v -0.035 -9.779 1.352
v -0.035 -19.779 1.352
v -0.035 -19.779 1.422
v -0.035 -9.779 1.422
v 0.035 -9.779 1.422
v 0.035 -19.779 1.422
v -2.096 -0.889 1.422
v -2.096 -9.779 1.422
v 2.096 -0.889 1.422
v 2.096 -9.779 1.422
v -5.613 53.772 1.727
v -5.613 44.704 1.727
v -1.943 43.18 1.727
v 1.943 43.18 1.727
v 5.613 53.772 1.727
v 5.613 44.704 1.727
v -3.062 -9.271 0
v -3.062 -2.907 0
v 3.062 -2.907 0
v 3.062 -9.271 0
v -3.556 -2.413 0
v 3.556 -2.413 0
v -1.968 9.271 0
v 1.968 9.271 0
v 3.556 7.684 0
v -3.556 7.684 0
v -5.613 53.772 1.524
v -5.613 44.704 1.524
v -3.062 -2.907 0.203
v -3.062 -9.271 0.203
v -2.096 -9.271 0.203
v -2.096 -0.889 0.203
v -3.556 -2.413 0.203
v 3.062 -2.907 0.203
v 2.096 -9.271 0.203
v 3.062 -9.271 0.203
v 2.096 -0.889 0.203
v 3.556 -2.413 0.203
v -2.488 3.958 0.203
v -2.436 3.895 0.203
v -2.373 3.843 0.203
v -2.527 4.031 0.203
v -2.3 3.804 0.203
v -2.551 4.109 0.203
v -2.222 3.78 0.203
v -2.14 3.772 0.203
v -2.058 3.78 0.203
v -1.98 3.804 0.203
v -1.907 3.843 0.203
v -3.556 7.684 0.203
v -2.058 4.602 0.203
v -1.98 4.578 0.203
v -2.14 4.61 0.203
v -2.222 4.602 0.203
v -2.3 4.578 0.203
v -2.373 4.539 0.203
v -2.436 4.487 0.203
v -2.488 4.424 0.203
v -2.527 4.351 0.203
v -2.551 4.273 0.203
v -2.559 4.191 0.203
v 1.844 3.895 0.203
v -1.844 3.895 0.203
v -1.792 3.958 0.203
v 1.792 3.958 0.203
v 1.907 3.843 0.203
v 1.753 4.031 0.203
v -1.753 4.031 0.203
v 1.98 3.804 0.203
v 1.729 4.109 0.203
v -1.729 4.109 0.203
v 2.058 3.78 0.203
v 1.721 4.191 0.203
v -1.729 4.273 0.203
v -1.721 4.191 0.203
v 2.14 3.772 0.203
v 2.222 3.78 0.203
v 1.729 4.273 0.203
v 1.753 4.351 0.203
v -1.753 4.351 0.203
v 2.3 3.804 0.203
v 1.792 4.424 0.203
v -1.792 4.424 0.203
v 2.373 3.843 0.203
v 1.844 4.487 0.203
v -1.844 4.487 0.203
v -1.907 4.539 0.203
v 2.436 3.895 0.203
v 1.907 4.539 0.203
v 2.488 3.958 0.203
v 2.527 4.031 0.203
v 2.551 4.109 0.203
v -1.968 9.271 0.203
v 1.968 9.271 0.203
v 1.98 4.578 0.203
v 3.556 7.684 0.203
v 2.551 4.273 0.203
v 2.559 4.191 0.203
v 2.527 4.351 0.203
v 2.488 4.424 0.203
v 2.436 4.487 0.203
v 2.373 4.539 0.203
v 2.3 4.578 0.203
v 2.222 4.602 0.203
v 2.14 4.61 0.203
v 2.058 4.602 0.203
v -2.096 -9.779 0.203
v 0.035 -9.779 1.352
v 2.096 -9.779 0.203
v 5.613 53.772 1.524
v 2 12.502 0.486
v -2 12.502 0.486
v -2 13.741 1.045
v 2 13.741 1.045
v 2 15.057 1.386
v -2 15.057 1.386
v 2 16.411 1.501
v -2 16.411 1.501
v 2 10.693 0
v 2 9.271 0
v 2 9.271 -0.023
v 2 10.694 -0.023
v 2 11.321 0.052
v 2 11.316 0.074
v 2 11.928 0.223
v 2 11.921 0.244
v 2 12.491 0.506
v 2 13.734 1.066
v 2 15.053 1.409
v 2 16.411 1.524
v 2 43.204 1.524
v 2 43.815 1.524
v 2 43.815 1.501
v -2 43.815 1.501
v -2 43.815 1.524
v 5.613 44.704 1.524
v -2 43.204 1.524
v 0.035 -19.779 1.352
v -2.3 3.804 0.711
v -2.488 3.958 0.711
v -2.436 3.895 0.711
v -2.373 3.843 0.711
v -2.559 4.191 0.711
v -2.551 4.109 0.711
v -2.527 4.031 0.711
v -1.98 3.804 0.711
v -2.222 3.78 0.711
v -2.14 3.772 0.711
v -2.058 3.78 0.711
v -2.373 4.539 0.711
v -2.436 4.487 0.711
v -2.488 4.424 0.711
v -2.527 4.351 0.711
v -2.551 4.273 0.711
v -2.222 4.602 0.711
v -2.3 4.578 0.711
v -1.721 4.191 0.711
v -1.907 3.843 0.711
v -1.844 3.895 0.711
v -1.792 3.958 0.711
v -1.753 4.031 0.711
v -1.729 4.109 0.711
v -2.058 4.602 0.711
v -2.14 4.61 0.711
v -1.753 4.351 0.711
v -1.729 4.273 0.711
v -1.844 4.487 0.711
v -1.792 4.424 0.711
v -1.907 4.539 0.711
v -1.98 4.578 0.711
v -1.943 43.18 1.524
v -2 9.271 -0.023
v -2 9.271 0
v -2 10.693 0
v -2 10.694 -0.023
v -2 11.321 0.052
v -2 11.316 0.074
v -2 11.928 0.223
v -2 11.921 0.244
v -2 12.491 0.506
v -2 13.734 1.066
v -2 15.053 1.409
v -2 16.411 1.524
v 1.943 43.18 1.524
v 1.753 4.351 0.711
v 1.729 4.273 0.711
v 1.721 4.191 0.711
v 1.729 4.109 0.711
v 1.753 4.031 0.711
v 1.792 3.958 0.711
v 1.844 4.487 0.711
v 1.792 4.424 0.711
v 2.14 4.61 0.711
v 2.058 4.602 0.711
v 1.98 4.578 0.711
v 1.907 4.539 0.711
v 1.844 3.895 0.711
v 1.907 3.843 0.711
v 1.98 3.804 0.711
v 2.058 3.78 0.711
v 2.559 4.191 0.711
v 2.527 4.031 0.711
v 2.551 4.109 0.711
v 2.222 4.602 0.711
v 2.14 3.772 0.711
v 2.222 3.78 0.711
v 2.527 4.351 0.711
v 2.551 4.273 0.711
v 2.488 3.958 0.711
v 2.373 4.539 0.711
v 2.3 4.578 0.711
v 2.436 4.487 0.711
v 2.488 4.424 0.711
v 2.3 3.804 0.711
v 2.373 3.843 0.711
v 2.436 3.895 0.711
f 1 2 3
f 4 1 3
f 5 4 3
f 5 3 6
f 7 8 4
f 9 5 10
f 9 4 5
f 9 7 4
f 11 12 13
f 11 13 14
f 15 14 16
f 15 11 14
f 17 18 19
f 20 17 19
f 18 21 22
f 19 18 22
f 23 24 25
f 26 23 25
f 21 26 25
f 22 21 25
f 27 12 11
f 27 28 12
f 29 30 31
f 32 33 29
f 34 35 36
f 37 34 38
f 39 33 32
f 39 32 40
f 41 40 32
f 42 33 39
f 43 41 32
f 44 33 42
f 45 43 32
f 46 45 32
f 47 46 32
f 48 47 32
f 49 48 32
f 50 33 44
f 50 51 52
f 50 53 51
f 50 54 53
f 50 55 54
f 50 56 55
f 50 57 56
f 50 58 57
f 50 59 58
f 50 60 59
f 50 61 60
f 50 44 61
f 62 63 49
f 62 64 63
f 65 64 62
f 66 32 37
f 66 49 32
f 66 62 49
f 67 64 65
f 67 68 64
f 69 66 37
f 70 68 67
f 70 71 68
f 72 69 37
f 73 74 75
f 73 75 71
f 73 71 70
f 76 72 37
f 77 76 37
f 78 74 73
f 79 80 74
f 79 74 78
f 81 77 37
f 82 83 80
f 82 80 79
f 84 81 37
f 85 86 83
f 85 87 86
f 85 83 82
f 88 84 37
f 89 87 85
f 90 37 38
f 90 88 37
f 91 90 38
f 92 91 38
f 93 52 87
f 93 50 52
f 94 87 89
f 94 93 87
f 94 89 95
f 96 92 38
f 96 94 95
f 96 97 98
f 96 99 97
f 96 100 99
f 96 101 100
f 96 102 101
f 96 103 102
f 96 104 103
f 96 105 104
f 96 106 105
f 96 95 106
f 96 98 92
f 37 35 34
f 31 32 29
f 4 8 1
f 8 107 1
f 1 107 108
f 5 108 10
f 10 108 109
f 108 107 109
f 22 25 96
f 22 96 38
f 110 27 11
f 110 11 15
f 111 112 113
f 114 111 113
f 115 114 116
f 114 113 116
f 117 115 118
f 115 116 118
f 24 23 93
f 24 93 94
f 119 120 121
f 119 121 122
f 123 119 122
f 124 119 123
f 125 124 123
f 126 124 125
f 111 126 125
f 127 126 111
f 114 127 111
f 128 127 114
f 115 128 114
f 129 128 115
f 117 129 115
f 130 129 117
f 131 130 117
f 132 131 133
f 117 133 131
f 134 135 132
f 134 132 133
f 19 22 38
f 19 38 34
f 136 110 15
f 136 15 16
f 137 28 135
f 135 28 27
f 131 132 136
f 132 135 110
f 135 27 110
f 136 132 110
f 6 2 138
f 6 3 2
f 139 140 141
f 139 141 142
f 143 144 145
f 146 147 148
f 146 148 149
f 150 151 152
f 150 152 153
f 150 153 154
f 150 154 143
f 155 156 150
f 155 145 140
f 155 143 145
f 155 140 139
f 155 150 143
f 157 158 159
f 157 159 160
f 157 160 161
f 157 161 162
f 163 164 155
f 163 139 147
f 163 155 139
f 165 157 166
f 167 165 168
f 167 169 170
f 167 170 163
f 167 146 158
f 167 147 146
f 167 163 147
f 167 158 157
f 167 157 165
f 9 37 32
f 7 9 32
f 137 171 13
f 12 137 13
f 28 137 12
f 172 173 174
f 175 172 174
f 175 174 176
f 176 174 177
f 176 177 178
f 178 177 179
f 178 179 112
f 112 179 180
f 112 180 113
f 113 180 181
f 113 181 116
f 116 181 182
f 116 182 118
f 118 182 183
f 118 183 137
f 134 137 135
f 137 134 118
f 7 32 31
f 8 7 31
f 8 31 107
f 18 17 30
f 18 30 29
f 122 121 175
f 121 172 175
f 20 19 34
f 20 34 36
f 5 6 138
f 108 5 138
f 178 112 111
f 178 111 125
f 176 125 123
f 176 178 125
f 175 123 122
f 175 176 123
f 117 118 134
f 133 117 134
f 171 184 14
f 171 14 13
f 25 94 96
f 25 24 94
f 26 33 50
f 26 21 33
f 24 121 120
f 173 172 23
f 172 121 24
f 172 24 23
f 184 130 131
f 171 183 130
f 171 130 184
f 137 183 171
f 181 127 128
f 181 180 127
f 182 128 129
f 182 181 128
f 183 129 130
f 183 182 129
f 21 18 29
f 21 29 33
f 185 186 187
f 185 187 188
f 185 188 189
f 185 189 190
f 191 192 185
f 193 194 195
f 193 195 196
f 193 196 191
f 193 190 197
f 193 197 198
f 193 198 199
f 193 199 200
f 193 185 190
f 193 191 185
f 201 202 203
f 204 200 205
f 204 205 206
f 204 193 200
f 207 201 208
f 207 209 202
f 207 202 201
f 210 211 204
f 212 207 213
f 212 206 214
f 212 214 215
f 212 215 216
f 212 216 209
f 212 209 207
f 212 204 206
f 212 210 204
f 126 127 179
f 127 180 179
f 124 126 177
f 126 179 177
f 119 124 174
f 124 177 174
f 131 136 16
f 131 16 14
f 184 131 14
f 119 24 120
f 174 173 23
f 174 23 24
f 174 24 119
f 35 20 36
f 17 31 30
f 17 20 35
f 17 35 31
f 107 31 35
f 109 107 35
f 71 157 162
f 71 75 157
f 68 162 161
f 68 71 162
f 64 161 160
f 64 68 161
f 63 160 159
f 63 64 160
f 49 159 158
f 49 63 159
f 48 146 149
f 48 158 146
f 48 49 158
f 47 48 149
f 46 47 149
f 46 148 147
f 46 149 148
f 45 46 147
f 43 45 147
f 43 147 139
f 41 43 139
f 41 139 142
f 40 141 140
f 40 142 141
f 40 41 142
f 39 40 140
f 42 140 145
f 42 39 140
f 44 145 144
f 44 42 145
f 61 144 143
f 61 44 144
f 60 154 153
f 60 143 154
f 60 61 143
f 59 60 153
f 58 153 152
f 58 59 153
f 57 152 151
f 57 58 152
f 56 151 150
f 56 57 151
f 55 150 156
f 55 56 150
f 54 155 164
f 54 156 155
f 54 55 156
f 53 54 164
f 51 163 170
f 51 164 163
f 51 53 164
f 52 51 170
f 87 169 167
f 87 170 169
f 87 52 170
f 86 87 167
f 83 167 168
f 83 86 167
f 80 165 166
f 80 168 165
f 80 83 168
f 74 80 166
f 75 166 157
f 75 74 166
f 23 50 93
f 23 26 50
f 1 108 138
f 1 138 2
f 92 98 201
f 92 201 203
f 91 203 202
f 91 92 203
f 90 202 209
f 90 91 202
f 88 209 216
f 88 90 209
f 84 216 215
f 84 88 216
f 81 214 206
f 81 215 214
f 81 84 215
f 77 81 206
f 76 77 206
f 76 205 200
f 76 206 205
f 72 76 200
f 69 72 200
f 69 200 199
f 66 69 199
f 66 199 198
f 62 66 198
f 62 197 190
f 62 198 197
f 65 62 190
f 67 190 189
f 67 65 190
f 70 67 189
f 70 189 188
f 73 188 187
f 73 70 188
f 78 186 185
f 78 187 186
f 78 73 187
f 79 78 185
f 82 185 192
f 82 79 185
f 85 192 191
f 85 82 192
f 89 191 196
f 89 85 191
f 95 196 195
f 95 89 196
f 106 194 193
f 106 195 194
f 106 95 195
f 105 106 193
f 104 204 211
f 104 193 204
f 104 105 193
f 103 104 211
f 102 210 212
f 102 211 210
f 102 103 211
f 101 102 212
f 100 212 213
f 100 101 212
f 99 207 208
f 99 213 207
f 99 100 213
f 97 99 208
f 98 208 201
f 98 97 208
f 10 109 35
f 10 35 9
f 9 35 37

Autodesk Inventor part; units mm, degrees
sketch "Sketch1" plane through (0, 0, 0) normal (0, 0, 1) x (1, 0, 0)
  line L0 (0, 133.1936) -> (0, -174.4071) projected
  line L1 (-82.221, 0) -> (96.7133, 0) projected
  line L2 (-11.8429, 78.7589) -> (29.9826, 78.7589) construction
  line L3 (29.9826, 78.7589) -> (29.9826, -20.6399) construction
  line L4 (29.9826, -20.6399) -> (-11.8429, -20.6399) construction
  line L5 (-11.8429, -20.6399) -> (-11.8429, 78.7589) construction
  line L6 (-7.642, -75.3683) -> (-7.642, -85.3683)
  line L7 (71.1512, 85.7776) -> (64.977, -130.4641) construction
  line L8 (64.977, -130.4641) -> (-56.659, -126.9911) construction
  line L9 (-56.659, -126.9911) -> (-50.4848, 89.2506) construction
  line L10 (-50.4848, 89.2506) -> (71.1512, 85.7776) construction
  line L11 (-1.9685, 9.271) -> (1.9685, 9.271)
  line L12 (1.9685, 9.271) -> (3.556, 7.6835)
  line L13 (3.556, 7.6835) -> (3.556, -2.413)
  line L14 (3.556, -2.413) -> (3.0619, -2.9071)
  line L15 (3.0619, -2.9071) -> (3.0619, -9.271)
  line L16 (3.0619, -9.271) -> (-3.0619, -9.271)
  line L17 (-3.0619, -9.271) -> (-3.0619, -2.9071)
  line L18 (-3.0619, -2.9071) -> (-3.556, -2.413)
  line L19 (-3.556, -2.413) -> (-3.556, 7.6835)
  line L20 (-3.556, 7.6835) -> (-1.9685, 9.271)
  line L21 (0, 0) -> (0, 10.9448)
  line L22 (1.9431, 43.18) -> (-1.9431, 43.18)
  line L23 (-1.9431, 43.18) -> (-1.9431, 9.271)
  line L24 (-1.9431, 9.271) -> (1.9431, 9.271)
  line L25 (1.9431, 9.271) -> (1.9431, 43.18)
  line L26 (1.9431, 43.18) -> (-1.9431, 9.271) construction
  line L27 (-1.9431, 43.18) -> (1.9431, 9.271) construction
  line L28 (-1.9431, 43.18) -> (-5.6134, 44.704)
  line L29 (-5.6134, 44.704) -> (-5.6134, 53.7718)
  line L30 (-5.6134, 53.7718) -> (5.6134, 53.7718)
  line L31 (5.6134, 53.7718) -> (5.6134, 44.704)
  line L32 (5.6134, 44.704) -> (1.9431, 43.18)
  point P0 (0, 26.2255)
  dimension "d175" = 10
  dimension "d243" = 18.542
  dimension "d244" = 9.271
  dimension "d245" = 7.112
  dimension "d246" = 3.937
  dimension "d247" = 11.684
  dimension "d263" = 33.909
  dimension "d264" = 3.8862
  dimension "d265" = 11.2268
  dimension "d266" = 5.6134
  dimension "d267" = 10.5918
  dimension "d268" = 9.0678
  dimension "d269" = 9.0678
ref_plane "Work Plane4" through (0, 0, 1.524) normal (0, 0, 1) x (1, 0, 0)
extrude "Extrusion4" add sketch "Sketch1" along normal blind 0.2032 contours L11 L12 L13 L1 L0 | L0 L1 L19 L20 L11 | L1 L13 L14 L15 L16 L0 | L0 L16 L17 L18 L19 L1
sketch "Sketch3" plane through (0, 0, 0) normal (1, 0, 0) x (0, 1, 0)
  line L0 (0, 49.0501) -> (0, -26.178) projected
  line L1 (9.271, 0.2032) -> (7.6835, 0.2032) projected
  line L2 (-34.4892, 0) -> (68.482, 0) projected
  line L3 (-32.4978, 1.524) -> (56.5338, 1.524) projected
  arc A0 (16.411, 1.524) -> (12.4911, 0.5057) centre (16.411, -6.5303) ccw
  line L4 (16.411, 1.524) -> (43.815, 1.524)
  line L5 (9.271, 0) -> (10.6931, 0)
  arc A1 (10.6931, 0) -> (12.4911, 0.5057) centre (10.5317, 4.0226) ccw
  line L6 (9.271, -0.0227) -> (10.6936, -0.0227)
  arc A2 (10.6936, -0.0227) -> (12.5021, 0.4859) centre (10.5317, 4.0226) ccw
  arc A3 (16.411, 1.5013) -> (12.5021, 0.4859) centre (16.411, -6.5303) ccw
  line L7 (16.411, 1.5013) -> (43.815, 1.5013)
  line L8 (43.815, 1.524) -> (43.815, 1.5013)
  line L9 (9.271, -0.0227) -> (9.271, 0)
  point P0 (0, 0)
  dimension "d301" = 43.815
ref_plane "Work Plane1" through (0, 0, 0.1778) normal (0, 0, 1) x (1, 0, 0)
sketch "Sketch4" plane through (0, 0, 0.1778) normal (0, 0, 1) x (1, 0, 0)
  point P0 (0, 0)
ref_plane "Work Plane2" through (0, 0, 0.75) normal (0, 0, 1) x (1, 0, 0)
sketch "Sketch10" plane through (0, 0, 1.524) normal (0, 0, 1) x (1, 0, 0)
  line L0 (-5.6134, 53.7718) -> (5.6134, 53.7718) projected
  line L1 (-5.6134, 44.704) -> (-5.6134, 53.7718) projected
  line L2 (5.6134, 53.7718) -> (5.6134, 44.704) projected
  line L3 (5.6134, 44.704) -> (1.9431, 43.18) projected
  line L4 (-1.9431, 43.18) -> (-5.6134, 44.704) projected
  line L5 (-5.6134, 44.704) -> (-5.6134, 53.7718)
  line L6 (-5.6134, 53.7718) -> (5.6134, 53.7718)
  line L7 (5.6134, 53.7718) -> (5.6134, 44.704)
  line L8 (-5.6134, 44.704) -> (-1.9431, 43.18)
  line L9 (5.6134, 44.704) -> (1.9431, 43.18)
  line L10 (1.9431, 43.18) -> (-1.9431, 43.18)
  point P0 (0, 0)
  dimension "d307" = 112.549
  dimension "d308" = 10.5918
extrude "Extrusion11" add sketch "Sketch10" along normal blind 0.2032
sketch "Sketch9" plane through (0, 0, 0.75) normal (0, 0, 1) x (1, 0, 0)
  point P0 (0, 0)
sketch "Sketch6" plane through (0, 0, 0.2032) normal (0, 0, 1) x (1, 0, 0)
  line L0 (0, 13.081) -> (0, -13.589) projected
  line L1 (-4.9784, 0) -> (4.9784, 0) projected
  line L2 (2.0955, -0.889) -> (-2.0955, -0.889)
  line L3 (-2.0955, -0.889) -> (-2.0955, -9.779)
  line L4 (-2.0955, -9.779) -> (2.0955, -9.779)
  line L5 (2.0955, -9.779) -> (2.0955, -0.889)
  line L6 (2.0955, -0.889) -> (-2.0955, -9.779) construction
  line L7 (-2.0955, -0.889) -> (2.0955, -9.779) construction
  line L8 (-3.0619, -9.271) -> (3.0619, -9.271) projected
  point P0 (0, 0)
  point P1 (0, -5.334)
  dimension "d283" = 4.191
  dimension "d284" = 0.508
  dimension "d285" = 8.89
extrude "Extrusion8" add sketch "Sketch6" along normal blind 1.2192
sketch "Sketch7" plane through (-2.0955, -9.779, 0.2032) normal (0, -1, 0) x (1, 0, 0)
  line L0 (0, 0) -> (4.191, 0) projected
  line L1 (4.191, 0) -> (4.191, 1.2192) projected
  line L2 (0, 1.2192) -> (4.191, 1.2192) projected
  line L3 (0, 0) -> (0, 1.2192) projected
  line L4 (2.0955, 1.8694) -> (2.0955, -0.5486) projected
  line L5 (2.1305, 1.1492) -> (2.0605, 1.1492)
  line L6 (2.0605, 1.1492) -> (2.0605, 1.2192)
  line L7 (2.0605, 1.2192) -> (2.1305, 1.2192)
  line L8 (2.1305, 1.2192) -> (2.1305, 1.1492)
  line L9 (2.1305, 1.1492) -> (2.0605, 1.2192) construction
  line L10 (2.0605, 1.1492) -> (2.1305, 1.2192) construction
  point P0 (2.0955, -0.2032)
  point P1 (2.0955, 1.1842)
  dimension "d288" = 0.07
  dimension "d289" = 0.07
extrude "Extrusion9" add sketch "Sketch7" along normal blind 10 contours L5 L6 L2 L4 | L4 L2 L8 L5
sketch "Sketch8" plane through (0, 0, 0.2032) normal (0, 0, 1) x (1, 0, 0)
  line L0 (2.0955, -0.889) -> (2.0955, -9.271) projected
  line L1 (2.0955, -9.271) -> (3.0619, -9.271) projected
  line L2 (3.0619, -9.271) -> (3.0619, -2.9071) projected
  line L3 (3.0619, -2.9071) -> (3.556, -2.413) projected
  line L4 (3.556, -2.413) -> (3.556, 7.6835) projected
  line L5 (3.556, 7.6835) -> (1.9685, 9.271) projected
  line L6 (1.9685, 9.271) -> (-1.9685, 9.271) projected
  line L7 (-1.9685, 9.271) -> (-3.556, 7.6835) projected
  line L8 (-3.556, 7.6835) -> (-3.556, -2.413) projected
  line L9 (-3.556, -2.413) -> (-3.0619, -2.9071) projected
  line L10 (-3.0619, -2.9071) -> (-3.0619, -9.271) projected
  line L11 (-3.0619, -9.271) -> (-2.0955, -9.271) projected
  line L12 (-2.0955, -9.271) -> (-2.0955, -0.889) projected
  line L13 (-2.0955, -0.889) -> (2.0955, -0.889) projected
  circle A0 centre (-2.14, 4.191) radius 0.4191
  circle A1 centre (2.14, 4.191) radius 0.4191
  point P0 (0, 0)
  dimension "d292" = 4.2799
  dimension "d294" = 2.1399
  dimension "d295" = 0.8382
  dimension "d314" = 5.08
extrude "Extrusion10" add sketch "Sketch8" along normal blind 0.508 contours A0 | A1
extrude "Extrusion12" add sketch "Sketch3" along normal mid plane 4.0005 contours L3 L8 L7 A3 A2 L2 A1 A0 | L2 A2 L6 L9
sketch "Sketch11" plane through (-2.0955, -19.779, 0.2032) normal (0, -1, 0) x (1, 0, 0)
  line L0 (2.0605, 1.2192) -> (2.0605, 1.1492) projected
  line L1 (2.0605, 1.1492) -> (2.1305, 1.1492) projected
  line L2 (2.1305, 1.1492) -> (2.1305, 1.2192) projected
  line L3 (2.1305, 1.2192) -> (2.0605, 1.2192) projected
  point P0 (2.0955, -0.2032)
  point P1 (2.0955, 1.1842)
  dimension "d320" = 0.035
  dimension "d321" = 0.035
properties part number "Neuropixels 1-3A Probe"
